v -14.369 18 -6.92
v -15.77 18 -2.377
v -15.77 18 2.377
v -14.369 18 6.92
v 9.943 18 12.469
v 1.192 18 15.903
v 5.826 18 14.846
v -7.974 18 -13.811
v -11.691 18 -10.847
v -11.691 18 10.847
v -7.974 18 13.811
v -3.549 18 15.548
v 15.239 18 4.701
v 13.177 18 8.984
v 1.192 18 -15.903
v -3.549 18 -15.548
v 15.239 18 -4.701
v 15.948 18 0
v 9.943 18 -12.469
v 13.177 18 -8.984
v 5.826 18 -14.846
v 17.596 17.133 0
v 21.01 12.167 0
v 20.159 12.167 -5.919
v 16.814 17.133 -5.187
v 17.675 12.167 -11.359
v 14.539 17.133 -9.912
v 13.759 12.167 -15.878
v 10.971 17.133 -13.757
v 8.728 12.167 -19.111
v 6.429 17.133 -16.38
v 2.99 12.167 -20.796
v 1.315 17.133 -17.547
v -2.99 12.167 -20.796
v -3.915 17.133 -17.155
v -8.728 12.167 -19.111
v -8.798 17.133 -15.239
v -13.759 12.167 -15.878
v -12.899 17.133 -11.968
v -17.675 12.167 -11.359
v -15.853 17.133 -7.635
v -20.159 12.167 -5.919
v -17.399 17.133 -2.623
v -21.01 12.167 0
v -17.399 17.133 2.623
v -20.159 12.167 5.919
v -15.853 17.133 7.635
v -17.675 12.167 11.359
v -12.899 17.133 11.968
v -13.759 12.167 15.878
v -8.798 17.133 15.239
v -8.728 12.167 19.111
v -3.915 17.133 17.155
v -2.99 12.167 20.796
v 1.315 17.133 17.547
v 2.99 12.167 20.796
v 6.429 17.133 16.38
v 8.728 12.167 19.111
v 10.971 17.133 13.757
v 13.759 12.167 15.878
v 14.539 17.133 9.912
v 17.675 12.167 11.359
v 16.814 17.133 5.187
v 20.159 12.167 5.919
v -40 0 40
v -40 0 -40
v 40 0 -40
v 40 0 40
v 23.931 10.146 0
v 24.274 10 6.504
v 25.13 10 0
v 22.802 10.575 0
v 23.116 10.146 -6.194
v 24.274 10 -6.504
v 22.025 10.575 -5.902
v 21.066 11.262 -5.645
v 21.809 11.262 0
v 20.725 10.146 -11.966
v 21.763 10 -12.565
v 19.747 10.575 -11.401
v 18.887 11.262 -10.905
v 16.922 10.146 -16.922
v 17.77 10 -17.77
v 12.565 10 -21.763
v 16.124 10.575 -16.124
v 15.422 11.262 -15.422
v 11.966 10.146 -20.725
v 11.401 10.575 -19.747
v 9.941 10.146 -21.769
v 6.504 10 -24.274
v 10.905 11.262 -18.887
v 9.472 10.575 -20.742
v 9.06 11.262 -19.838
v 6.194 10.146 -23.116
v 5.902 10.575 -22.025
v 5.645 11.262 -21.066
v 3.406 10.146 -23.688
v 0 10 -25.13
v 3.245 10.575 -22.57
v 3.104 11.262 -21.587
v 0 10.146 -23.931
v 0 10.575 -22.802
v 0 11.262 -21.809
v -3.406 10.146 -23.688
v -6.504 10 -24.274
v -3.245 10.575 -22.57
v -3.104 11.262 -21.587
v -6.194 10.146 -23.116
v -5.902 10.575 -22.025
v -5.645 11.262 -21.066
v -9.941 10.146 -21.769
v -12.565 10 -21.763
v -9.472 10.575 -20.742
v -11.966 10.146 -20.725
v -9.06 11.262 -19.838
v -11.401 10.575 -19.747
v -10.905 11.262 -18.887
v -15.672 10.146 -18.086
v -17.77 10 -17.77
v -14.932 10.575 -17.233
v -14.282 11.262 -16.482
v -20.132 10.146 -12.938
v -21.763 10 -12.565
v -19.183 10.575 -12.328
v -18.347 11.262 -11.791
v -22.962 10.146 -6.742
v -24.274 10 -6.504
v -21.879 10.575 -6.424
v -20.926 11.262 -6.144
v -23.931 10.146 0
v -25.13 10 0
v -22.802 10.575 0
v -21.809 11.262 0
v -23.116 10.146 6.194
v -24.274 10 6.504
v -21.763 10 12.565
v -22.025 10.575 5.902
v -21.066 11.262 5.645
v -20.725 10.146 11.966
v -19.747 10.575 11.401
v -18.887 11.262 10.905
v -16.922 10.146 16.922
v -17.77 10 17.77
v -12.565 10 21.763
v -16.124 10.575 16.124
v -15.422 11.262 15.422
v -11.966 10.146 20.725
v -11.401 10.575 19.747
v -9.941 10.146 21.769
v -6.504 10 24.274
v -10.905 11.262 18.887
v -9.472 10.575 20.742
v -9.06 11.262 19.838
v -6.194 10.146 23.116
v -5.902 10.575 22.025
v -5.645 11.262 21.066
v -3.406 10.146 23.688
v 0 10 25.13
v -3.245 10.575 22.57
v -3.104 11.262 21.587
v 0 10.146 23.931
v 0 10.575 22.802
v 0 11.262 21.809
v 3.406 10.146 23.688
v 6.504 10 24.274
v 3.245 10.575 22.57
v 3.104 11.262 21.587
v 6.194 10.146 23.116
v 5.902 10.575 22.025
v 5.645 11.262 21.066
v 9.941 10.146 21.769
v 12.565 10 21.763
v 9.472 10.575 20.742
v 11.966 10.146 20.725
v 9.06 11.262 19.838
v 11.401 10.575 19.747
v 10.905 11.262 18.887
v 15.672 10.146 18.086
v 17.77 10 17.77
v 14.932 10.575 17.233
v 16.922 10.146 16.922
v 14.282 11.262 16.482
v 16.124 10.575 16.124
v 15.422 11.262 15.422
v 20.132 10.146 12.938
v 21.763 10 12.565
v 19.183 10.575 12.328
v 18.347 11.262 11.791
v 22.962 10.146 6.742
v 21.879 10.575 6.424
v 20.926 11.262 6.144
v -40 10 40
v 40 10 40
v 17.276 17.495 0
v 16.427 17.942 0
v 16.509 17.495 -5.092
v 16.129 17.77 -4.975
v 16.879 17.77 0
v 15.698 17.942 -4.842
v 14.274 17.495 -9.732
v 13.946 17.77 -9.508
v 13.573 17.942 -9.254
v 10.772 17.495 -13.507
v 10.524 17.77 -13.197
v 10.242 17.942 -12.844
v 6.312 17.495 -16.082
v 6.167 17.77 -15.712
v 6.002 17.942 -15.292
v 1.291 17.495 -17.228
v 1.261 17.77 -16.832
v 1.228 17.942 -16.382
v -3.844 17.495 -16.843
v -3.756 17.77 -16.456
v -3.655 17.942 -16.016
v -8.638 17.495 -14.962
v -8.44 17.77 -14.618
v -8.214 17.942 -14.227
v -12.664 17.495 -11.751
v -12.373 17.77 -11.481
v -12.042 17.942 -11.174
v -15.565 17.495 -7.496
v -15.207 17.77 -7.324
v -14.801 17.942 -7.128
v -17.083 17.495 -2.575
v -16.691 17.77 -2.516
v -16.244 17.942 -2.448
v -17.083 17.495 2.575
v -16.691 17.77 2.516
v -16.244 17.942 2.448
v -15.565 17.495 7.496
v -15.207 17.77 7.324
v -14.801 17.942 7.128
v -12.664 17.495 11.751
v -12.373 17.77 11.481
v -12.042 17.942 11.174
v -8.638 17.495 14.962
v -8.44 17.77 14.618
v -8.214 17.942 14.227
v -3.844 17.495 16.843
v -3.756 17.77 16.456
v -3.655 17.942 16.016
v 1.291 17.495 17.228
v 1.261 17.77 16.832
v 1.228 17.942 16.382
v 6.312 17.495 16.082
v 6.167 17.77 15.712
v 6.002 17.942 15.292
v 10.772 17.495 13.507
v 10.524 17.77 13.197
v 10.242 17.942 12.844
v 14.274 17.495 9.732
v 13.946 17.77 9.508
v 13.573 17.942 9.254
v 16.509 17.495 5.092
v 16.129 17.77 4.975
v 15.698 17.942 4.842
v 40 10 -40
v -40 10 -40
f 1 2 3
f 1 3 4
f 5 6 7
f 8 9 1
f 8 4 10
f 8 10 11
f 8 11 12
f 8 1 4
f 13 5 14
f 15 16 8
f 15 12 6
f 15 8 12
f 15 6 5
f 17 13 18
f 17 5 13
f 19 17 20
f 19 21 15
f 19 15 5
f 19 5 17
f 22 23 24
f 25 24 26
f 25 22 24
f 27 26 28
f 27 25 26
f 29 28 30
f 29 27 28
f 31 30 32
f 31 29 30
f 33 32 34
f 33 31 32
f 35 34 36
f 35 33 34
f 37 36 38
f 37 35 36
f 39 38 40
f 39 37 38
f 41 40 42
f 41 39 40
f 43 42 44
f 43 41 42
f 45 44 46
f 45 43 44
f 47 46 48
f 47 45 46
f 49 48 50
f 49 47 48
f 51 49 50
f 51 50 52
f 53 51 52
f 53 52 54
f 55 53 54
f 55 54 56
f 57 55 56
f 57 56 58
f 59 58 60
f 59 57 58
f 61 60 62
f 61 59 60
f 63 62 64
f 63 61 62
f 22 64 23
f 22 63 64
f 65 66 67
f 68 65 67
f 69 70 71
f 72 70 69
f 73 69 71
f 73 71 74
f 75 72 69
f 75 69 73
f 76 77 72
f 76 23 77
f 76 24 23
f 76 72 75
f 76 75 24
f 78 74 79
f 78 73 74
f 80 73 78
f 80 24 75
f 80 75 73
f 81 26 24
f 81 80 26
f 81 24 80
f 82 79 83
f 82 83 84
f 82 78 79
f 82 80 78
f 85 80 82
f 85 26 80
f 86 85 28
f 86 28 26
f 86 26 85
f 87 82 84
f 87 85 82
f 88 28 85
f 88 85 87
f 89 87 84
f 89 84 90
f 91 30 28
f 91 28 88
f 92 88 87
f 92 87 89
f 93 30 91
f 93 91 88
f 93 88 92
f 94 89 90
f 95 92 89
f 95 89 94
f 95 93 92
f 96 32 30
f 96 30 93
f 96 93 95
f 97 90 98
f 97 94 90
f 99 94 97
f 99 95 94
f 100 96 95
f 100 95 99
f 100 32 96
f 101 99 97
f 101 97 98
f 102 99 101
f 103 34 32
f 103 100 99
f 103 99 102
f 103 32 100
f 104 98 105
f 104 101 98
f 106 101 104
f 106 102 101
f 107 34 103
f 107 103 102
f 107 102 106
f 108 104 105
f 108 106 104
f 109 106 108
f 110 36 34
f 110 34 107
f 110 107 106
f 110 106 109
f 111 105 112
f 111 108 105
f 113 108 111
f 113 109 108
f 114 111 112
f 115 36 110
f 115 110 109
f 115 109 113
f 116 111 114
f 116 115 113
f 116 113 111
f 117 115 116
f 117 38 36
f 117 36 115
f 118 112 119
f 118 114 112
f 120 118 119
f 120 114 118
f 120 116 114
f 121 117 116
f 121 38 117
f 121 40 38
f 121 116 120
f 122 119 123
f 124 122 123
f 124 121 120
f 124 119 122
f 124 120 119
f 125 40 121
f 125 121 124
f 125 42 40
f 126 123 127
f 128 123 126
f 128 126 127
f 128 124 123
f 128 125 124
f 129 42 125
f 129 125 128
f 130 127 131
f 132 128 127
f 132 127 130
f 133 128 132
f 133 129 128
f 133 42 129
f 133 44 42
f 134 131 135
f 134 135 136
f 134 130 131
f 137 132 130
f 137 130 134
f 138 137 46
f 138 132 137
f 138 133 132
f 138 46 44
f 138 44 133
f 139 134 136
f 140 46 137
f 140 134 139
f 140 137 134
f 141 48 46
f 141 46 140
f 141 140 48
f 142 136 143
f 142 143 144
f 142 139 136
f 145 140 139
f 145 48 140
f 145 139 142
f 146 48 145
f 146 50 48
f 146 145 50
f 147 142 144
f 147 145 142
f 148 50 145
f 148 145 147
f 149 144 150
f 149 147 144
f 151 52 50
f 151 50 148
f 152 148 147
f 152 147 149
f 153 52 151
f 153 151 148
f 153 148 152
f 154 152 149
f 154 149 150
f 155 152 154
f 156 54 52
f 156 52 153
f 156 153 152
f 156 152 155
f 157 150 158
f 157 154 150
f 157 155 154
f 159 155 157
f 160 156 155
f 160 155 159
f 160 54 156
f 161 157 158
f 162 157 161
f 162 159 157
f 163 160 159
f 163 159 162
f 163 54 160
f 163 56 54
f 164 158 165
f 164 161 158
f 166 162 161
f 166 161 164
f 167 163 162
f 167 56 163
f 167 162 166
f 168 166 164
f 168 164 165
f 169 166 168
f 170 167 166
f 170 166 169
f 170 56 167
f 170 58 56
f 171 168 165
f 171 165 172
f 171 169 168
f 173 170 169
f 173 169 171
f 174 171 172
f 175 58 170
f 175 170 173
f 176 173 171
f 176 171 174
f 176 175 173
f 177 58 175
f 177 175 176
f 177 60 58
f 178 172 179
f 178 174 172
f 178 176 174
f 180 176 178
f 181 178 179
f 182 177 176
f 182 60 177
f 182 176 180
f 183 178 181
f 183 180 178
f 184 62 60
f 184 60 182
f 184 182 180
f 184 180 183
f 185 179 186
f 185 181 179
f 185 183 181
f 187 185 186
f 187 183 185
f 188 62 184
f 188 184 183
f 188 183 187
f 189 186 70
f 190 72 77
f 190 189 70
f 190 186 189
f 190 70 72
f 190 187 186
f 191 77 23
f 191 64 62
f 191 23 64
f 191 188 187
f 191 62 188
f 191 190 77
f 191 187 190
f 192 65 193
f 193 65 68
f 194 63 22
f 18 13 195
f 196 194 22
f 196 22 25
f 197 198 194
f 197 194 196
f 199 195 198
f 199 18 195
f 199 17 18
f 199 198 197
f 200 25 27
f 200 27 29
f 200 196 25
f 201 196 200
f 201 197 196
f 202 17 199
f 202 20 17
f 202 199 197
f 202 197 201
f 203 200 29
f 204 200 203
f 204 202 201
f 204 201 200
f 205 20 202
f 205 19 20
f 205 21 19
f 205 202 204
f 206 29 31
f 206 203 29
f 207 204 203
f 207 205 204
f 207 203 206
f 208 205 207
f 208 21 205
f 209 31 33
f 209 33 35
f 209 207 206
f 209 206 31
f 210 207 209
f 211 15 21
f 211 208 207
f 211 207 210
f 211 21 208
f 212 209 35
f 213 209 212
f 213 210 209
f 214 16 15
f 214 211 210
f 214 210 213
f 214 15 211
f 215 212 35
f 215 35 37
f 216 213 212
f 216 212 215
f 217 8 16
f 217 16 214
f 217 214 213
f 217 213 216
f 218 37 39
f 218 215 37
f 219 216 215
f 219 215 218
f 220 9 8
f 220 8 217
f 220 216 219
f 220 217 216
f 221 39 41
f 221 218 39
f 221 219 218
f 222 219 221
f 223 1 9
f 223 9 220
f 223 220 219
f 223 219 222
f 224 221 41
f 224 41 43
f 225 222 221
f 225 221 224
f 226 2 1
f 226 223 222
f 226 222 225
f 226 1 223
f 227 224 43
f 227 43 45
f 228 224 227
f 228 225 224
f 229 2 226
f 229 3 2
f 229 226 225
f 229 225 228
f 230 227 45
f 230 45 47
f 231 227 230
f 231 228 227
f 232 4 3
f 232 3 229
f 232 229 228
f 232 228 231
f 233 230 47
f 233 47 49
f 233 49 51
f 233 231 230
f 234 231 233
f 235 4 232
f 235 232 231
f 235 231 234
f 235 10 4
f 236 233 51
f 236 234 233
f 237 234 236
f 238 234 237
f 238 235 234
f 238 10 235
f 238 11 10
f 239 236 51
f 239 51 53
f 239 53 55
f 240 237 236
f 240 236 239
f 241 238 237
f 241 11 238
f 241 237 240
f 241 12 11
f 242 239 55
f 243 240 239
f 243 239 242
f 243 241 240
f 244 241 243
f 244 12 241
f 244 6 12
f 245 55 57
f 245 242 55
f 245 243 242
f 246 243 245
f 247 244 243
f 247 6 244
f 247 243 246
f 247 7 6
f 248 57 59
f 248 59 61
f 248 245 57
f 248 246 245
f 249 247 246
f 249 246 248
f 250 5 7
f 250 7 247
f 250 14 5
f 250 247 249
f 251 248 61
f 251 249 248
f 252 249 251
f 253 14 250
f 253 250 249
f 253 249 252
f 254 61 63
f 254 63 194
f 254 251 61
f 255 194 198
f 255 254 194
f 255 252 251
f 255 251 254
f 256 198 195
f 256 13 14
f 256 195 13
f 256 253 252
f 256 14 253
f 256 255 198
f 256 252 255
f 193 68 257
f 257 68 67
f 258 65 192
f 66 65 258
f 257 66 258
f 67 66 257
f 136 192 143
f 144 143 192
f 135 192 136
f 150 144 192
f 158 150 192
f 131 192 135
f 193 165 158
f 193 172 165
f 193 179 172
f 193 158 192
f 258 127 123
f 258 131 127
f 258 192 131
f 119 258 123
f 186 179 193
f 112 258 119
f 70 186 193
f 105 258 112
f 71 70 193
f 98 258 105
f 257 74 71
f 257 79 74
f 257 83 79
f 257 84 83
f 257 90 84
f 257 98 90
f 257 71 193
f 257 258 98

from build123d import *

# Parameters (mm, degrees)
SKETCH_1_W      = 80
SKETCH_1_H      = 80
EXTRUDE_1_DEPTH = 10
FILLET_1_R      = 5
FILLET_2_R      = 2


with BuildPart() as part:
    # 草图1 → 凸台-拉伸1 (new body)
    with BuildSketch(Plane(origin=(0, 0, 0), x_dir=(1, 0, 0), z_dir=(0, 1, 0))):
        Rectangle(SKETCH_1_W, SKETCH_1_H)
    extrude(amount=EXTRUDE_1_DEPTH)

    # 草图2 → 旋转1 (revolve)
    with BuildSketch(Plane.XY):
        Polygon((0, 18), (0, 10), (22.5, 10), (17, 18), align=None)
    revolve(axis=Axis((0, 0, 0), (0, 1, 0)))

    # 圆角1
    fillet_1_edges = [part.edges().sort_by_distance(p)[0] for p in [
        (-22.5, 10, 0),
    ]]
    fillet(fillet_1_edges, radius=FILLET_1_R)

    # 圆角2
    fillet_2_edges = [part.edges().sort_by_distance(p)[0] for p in [
        (-17, 18, 0),
    ]]
    fillet(fillet_2_edges, radius=FILLET_2_R)


solid = part.part
